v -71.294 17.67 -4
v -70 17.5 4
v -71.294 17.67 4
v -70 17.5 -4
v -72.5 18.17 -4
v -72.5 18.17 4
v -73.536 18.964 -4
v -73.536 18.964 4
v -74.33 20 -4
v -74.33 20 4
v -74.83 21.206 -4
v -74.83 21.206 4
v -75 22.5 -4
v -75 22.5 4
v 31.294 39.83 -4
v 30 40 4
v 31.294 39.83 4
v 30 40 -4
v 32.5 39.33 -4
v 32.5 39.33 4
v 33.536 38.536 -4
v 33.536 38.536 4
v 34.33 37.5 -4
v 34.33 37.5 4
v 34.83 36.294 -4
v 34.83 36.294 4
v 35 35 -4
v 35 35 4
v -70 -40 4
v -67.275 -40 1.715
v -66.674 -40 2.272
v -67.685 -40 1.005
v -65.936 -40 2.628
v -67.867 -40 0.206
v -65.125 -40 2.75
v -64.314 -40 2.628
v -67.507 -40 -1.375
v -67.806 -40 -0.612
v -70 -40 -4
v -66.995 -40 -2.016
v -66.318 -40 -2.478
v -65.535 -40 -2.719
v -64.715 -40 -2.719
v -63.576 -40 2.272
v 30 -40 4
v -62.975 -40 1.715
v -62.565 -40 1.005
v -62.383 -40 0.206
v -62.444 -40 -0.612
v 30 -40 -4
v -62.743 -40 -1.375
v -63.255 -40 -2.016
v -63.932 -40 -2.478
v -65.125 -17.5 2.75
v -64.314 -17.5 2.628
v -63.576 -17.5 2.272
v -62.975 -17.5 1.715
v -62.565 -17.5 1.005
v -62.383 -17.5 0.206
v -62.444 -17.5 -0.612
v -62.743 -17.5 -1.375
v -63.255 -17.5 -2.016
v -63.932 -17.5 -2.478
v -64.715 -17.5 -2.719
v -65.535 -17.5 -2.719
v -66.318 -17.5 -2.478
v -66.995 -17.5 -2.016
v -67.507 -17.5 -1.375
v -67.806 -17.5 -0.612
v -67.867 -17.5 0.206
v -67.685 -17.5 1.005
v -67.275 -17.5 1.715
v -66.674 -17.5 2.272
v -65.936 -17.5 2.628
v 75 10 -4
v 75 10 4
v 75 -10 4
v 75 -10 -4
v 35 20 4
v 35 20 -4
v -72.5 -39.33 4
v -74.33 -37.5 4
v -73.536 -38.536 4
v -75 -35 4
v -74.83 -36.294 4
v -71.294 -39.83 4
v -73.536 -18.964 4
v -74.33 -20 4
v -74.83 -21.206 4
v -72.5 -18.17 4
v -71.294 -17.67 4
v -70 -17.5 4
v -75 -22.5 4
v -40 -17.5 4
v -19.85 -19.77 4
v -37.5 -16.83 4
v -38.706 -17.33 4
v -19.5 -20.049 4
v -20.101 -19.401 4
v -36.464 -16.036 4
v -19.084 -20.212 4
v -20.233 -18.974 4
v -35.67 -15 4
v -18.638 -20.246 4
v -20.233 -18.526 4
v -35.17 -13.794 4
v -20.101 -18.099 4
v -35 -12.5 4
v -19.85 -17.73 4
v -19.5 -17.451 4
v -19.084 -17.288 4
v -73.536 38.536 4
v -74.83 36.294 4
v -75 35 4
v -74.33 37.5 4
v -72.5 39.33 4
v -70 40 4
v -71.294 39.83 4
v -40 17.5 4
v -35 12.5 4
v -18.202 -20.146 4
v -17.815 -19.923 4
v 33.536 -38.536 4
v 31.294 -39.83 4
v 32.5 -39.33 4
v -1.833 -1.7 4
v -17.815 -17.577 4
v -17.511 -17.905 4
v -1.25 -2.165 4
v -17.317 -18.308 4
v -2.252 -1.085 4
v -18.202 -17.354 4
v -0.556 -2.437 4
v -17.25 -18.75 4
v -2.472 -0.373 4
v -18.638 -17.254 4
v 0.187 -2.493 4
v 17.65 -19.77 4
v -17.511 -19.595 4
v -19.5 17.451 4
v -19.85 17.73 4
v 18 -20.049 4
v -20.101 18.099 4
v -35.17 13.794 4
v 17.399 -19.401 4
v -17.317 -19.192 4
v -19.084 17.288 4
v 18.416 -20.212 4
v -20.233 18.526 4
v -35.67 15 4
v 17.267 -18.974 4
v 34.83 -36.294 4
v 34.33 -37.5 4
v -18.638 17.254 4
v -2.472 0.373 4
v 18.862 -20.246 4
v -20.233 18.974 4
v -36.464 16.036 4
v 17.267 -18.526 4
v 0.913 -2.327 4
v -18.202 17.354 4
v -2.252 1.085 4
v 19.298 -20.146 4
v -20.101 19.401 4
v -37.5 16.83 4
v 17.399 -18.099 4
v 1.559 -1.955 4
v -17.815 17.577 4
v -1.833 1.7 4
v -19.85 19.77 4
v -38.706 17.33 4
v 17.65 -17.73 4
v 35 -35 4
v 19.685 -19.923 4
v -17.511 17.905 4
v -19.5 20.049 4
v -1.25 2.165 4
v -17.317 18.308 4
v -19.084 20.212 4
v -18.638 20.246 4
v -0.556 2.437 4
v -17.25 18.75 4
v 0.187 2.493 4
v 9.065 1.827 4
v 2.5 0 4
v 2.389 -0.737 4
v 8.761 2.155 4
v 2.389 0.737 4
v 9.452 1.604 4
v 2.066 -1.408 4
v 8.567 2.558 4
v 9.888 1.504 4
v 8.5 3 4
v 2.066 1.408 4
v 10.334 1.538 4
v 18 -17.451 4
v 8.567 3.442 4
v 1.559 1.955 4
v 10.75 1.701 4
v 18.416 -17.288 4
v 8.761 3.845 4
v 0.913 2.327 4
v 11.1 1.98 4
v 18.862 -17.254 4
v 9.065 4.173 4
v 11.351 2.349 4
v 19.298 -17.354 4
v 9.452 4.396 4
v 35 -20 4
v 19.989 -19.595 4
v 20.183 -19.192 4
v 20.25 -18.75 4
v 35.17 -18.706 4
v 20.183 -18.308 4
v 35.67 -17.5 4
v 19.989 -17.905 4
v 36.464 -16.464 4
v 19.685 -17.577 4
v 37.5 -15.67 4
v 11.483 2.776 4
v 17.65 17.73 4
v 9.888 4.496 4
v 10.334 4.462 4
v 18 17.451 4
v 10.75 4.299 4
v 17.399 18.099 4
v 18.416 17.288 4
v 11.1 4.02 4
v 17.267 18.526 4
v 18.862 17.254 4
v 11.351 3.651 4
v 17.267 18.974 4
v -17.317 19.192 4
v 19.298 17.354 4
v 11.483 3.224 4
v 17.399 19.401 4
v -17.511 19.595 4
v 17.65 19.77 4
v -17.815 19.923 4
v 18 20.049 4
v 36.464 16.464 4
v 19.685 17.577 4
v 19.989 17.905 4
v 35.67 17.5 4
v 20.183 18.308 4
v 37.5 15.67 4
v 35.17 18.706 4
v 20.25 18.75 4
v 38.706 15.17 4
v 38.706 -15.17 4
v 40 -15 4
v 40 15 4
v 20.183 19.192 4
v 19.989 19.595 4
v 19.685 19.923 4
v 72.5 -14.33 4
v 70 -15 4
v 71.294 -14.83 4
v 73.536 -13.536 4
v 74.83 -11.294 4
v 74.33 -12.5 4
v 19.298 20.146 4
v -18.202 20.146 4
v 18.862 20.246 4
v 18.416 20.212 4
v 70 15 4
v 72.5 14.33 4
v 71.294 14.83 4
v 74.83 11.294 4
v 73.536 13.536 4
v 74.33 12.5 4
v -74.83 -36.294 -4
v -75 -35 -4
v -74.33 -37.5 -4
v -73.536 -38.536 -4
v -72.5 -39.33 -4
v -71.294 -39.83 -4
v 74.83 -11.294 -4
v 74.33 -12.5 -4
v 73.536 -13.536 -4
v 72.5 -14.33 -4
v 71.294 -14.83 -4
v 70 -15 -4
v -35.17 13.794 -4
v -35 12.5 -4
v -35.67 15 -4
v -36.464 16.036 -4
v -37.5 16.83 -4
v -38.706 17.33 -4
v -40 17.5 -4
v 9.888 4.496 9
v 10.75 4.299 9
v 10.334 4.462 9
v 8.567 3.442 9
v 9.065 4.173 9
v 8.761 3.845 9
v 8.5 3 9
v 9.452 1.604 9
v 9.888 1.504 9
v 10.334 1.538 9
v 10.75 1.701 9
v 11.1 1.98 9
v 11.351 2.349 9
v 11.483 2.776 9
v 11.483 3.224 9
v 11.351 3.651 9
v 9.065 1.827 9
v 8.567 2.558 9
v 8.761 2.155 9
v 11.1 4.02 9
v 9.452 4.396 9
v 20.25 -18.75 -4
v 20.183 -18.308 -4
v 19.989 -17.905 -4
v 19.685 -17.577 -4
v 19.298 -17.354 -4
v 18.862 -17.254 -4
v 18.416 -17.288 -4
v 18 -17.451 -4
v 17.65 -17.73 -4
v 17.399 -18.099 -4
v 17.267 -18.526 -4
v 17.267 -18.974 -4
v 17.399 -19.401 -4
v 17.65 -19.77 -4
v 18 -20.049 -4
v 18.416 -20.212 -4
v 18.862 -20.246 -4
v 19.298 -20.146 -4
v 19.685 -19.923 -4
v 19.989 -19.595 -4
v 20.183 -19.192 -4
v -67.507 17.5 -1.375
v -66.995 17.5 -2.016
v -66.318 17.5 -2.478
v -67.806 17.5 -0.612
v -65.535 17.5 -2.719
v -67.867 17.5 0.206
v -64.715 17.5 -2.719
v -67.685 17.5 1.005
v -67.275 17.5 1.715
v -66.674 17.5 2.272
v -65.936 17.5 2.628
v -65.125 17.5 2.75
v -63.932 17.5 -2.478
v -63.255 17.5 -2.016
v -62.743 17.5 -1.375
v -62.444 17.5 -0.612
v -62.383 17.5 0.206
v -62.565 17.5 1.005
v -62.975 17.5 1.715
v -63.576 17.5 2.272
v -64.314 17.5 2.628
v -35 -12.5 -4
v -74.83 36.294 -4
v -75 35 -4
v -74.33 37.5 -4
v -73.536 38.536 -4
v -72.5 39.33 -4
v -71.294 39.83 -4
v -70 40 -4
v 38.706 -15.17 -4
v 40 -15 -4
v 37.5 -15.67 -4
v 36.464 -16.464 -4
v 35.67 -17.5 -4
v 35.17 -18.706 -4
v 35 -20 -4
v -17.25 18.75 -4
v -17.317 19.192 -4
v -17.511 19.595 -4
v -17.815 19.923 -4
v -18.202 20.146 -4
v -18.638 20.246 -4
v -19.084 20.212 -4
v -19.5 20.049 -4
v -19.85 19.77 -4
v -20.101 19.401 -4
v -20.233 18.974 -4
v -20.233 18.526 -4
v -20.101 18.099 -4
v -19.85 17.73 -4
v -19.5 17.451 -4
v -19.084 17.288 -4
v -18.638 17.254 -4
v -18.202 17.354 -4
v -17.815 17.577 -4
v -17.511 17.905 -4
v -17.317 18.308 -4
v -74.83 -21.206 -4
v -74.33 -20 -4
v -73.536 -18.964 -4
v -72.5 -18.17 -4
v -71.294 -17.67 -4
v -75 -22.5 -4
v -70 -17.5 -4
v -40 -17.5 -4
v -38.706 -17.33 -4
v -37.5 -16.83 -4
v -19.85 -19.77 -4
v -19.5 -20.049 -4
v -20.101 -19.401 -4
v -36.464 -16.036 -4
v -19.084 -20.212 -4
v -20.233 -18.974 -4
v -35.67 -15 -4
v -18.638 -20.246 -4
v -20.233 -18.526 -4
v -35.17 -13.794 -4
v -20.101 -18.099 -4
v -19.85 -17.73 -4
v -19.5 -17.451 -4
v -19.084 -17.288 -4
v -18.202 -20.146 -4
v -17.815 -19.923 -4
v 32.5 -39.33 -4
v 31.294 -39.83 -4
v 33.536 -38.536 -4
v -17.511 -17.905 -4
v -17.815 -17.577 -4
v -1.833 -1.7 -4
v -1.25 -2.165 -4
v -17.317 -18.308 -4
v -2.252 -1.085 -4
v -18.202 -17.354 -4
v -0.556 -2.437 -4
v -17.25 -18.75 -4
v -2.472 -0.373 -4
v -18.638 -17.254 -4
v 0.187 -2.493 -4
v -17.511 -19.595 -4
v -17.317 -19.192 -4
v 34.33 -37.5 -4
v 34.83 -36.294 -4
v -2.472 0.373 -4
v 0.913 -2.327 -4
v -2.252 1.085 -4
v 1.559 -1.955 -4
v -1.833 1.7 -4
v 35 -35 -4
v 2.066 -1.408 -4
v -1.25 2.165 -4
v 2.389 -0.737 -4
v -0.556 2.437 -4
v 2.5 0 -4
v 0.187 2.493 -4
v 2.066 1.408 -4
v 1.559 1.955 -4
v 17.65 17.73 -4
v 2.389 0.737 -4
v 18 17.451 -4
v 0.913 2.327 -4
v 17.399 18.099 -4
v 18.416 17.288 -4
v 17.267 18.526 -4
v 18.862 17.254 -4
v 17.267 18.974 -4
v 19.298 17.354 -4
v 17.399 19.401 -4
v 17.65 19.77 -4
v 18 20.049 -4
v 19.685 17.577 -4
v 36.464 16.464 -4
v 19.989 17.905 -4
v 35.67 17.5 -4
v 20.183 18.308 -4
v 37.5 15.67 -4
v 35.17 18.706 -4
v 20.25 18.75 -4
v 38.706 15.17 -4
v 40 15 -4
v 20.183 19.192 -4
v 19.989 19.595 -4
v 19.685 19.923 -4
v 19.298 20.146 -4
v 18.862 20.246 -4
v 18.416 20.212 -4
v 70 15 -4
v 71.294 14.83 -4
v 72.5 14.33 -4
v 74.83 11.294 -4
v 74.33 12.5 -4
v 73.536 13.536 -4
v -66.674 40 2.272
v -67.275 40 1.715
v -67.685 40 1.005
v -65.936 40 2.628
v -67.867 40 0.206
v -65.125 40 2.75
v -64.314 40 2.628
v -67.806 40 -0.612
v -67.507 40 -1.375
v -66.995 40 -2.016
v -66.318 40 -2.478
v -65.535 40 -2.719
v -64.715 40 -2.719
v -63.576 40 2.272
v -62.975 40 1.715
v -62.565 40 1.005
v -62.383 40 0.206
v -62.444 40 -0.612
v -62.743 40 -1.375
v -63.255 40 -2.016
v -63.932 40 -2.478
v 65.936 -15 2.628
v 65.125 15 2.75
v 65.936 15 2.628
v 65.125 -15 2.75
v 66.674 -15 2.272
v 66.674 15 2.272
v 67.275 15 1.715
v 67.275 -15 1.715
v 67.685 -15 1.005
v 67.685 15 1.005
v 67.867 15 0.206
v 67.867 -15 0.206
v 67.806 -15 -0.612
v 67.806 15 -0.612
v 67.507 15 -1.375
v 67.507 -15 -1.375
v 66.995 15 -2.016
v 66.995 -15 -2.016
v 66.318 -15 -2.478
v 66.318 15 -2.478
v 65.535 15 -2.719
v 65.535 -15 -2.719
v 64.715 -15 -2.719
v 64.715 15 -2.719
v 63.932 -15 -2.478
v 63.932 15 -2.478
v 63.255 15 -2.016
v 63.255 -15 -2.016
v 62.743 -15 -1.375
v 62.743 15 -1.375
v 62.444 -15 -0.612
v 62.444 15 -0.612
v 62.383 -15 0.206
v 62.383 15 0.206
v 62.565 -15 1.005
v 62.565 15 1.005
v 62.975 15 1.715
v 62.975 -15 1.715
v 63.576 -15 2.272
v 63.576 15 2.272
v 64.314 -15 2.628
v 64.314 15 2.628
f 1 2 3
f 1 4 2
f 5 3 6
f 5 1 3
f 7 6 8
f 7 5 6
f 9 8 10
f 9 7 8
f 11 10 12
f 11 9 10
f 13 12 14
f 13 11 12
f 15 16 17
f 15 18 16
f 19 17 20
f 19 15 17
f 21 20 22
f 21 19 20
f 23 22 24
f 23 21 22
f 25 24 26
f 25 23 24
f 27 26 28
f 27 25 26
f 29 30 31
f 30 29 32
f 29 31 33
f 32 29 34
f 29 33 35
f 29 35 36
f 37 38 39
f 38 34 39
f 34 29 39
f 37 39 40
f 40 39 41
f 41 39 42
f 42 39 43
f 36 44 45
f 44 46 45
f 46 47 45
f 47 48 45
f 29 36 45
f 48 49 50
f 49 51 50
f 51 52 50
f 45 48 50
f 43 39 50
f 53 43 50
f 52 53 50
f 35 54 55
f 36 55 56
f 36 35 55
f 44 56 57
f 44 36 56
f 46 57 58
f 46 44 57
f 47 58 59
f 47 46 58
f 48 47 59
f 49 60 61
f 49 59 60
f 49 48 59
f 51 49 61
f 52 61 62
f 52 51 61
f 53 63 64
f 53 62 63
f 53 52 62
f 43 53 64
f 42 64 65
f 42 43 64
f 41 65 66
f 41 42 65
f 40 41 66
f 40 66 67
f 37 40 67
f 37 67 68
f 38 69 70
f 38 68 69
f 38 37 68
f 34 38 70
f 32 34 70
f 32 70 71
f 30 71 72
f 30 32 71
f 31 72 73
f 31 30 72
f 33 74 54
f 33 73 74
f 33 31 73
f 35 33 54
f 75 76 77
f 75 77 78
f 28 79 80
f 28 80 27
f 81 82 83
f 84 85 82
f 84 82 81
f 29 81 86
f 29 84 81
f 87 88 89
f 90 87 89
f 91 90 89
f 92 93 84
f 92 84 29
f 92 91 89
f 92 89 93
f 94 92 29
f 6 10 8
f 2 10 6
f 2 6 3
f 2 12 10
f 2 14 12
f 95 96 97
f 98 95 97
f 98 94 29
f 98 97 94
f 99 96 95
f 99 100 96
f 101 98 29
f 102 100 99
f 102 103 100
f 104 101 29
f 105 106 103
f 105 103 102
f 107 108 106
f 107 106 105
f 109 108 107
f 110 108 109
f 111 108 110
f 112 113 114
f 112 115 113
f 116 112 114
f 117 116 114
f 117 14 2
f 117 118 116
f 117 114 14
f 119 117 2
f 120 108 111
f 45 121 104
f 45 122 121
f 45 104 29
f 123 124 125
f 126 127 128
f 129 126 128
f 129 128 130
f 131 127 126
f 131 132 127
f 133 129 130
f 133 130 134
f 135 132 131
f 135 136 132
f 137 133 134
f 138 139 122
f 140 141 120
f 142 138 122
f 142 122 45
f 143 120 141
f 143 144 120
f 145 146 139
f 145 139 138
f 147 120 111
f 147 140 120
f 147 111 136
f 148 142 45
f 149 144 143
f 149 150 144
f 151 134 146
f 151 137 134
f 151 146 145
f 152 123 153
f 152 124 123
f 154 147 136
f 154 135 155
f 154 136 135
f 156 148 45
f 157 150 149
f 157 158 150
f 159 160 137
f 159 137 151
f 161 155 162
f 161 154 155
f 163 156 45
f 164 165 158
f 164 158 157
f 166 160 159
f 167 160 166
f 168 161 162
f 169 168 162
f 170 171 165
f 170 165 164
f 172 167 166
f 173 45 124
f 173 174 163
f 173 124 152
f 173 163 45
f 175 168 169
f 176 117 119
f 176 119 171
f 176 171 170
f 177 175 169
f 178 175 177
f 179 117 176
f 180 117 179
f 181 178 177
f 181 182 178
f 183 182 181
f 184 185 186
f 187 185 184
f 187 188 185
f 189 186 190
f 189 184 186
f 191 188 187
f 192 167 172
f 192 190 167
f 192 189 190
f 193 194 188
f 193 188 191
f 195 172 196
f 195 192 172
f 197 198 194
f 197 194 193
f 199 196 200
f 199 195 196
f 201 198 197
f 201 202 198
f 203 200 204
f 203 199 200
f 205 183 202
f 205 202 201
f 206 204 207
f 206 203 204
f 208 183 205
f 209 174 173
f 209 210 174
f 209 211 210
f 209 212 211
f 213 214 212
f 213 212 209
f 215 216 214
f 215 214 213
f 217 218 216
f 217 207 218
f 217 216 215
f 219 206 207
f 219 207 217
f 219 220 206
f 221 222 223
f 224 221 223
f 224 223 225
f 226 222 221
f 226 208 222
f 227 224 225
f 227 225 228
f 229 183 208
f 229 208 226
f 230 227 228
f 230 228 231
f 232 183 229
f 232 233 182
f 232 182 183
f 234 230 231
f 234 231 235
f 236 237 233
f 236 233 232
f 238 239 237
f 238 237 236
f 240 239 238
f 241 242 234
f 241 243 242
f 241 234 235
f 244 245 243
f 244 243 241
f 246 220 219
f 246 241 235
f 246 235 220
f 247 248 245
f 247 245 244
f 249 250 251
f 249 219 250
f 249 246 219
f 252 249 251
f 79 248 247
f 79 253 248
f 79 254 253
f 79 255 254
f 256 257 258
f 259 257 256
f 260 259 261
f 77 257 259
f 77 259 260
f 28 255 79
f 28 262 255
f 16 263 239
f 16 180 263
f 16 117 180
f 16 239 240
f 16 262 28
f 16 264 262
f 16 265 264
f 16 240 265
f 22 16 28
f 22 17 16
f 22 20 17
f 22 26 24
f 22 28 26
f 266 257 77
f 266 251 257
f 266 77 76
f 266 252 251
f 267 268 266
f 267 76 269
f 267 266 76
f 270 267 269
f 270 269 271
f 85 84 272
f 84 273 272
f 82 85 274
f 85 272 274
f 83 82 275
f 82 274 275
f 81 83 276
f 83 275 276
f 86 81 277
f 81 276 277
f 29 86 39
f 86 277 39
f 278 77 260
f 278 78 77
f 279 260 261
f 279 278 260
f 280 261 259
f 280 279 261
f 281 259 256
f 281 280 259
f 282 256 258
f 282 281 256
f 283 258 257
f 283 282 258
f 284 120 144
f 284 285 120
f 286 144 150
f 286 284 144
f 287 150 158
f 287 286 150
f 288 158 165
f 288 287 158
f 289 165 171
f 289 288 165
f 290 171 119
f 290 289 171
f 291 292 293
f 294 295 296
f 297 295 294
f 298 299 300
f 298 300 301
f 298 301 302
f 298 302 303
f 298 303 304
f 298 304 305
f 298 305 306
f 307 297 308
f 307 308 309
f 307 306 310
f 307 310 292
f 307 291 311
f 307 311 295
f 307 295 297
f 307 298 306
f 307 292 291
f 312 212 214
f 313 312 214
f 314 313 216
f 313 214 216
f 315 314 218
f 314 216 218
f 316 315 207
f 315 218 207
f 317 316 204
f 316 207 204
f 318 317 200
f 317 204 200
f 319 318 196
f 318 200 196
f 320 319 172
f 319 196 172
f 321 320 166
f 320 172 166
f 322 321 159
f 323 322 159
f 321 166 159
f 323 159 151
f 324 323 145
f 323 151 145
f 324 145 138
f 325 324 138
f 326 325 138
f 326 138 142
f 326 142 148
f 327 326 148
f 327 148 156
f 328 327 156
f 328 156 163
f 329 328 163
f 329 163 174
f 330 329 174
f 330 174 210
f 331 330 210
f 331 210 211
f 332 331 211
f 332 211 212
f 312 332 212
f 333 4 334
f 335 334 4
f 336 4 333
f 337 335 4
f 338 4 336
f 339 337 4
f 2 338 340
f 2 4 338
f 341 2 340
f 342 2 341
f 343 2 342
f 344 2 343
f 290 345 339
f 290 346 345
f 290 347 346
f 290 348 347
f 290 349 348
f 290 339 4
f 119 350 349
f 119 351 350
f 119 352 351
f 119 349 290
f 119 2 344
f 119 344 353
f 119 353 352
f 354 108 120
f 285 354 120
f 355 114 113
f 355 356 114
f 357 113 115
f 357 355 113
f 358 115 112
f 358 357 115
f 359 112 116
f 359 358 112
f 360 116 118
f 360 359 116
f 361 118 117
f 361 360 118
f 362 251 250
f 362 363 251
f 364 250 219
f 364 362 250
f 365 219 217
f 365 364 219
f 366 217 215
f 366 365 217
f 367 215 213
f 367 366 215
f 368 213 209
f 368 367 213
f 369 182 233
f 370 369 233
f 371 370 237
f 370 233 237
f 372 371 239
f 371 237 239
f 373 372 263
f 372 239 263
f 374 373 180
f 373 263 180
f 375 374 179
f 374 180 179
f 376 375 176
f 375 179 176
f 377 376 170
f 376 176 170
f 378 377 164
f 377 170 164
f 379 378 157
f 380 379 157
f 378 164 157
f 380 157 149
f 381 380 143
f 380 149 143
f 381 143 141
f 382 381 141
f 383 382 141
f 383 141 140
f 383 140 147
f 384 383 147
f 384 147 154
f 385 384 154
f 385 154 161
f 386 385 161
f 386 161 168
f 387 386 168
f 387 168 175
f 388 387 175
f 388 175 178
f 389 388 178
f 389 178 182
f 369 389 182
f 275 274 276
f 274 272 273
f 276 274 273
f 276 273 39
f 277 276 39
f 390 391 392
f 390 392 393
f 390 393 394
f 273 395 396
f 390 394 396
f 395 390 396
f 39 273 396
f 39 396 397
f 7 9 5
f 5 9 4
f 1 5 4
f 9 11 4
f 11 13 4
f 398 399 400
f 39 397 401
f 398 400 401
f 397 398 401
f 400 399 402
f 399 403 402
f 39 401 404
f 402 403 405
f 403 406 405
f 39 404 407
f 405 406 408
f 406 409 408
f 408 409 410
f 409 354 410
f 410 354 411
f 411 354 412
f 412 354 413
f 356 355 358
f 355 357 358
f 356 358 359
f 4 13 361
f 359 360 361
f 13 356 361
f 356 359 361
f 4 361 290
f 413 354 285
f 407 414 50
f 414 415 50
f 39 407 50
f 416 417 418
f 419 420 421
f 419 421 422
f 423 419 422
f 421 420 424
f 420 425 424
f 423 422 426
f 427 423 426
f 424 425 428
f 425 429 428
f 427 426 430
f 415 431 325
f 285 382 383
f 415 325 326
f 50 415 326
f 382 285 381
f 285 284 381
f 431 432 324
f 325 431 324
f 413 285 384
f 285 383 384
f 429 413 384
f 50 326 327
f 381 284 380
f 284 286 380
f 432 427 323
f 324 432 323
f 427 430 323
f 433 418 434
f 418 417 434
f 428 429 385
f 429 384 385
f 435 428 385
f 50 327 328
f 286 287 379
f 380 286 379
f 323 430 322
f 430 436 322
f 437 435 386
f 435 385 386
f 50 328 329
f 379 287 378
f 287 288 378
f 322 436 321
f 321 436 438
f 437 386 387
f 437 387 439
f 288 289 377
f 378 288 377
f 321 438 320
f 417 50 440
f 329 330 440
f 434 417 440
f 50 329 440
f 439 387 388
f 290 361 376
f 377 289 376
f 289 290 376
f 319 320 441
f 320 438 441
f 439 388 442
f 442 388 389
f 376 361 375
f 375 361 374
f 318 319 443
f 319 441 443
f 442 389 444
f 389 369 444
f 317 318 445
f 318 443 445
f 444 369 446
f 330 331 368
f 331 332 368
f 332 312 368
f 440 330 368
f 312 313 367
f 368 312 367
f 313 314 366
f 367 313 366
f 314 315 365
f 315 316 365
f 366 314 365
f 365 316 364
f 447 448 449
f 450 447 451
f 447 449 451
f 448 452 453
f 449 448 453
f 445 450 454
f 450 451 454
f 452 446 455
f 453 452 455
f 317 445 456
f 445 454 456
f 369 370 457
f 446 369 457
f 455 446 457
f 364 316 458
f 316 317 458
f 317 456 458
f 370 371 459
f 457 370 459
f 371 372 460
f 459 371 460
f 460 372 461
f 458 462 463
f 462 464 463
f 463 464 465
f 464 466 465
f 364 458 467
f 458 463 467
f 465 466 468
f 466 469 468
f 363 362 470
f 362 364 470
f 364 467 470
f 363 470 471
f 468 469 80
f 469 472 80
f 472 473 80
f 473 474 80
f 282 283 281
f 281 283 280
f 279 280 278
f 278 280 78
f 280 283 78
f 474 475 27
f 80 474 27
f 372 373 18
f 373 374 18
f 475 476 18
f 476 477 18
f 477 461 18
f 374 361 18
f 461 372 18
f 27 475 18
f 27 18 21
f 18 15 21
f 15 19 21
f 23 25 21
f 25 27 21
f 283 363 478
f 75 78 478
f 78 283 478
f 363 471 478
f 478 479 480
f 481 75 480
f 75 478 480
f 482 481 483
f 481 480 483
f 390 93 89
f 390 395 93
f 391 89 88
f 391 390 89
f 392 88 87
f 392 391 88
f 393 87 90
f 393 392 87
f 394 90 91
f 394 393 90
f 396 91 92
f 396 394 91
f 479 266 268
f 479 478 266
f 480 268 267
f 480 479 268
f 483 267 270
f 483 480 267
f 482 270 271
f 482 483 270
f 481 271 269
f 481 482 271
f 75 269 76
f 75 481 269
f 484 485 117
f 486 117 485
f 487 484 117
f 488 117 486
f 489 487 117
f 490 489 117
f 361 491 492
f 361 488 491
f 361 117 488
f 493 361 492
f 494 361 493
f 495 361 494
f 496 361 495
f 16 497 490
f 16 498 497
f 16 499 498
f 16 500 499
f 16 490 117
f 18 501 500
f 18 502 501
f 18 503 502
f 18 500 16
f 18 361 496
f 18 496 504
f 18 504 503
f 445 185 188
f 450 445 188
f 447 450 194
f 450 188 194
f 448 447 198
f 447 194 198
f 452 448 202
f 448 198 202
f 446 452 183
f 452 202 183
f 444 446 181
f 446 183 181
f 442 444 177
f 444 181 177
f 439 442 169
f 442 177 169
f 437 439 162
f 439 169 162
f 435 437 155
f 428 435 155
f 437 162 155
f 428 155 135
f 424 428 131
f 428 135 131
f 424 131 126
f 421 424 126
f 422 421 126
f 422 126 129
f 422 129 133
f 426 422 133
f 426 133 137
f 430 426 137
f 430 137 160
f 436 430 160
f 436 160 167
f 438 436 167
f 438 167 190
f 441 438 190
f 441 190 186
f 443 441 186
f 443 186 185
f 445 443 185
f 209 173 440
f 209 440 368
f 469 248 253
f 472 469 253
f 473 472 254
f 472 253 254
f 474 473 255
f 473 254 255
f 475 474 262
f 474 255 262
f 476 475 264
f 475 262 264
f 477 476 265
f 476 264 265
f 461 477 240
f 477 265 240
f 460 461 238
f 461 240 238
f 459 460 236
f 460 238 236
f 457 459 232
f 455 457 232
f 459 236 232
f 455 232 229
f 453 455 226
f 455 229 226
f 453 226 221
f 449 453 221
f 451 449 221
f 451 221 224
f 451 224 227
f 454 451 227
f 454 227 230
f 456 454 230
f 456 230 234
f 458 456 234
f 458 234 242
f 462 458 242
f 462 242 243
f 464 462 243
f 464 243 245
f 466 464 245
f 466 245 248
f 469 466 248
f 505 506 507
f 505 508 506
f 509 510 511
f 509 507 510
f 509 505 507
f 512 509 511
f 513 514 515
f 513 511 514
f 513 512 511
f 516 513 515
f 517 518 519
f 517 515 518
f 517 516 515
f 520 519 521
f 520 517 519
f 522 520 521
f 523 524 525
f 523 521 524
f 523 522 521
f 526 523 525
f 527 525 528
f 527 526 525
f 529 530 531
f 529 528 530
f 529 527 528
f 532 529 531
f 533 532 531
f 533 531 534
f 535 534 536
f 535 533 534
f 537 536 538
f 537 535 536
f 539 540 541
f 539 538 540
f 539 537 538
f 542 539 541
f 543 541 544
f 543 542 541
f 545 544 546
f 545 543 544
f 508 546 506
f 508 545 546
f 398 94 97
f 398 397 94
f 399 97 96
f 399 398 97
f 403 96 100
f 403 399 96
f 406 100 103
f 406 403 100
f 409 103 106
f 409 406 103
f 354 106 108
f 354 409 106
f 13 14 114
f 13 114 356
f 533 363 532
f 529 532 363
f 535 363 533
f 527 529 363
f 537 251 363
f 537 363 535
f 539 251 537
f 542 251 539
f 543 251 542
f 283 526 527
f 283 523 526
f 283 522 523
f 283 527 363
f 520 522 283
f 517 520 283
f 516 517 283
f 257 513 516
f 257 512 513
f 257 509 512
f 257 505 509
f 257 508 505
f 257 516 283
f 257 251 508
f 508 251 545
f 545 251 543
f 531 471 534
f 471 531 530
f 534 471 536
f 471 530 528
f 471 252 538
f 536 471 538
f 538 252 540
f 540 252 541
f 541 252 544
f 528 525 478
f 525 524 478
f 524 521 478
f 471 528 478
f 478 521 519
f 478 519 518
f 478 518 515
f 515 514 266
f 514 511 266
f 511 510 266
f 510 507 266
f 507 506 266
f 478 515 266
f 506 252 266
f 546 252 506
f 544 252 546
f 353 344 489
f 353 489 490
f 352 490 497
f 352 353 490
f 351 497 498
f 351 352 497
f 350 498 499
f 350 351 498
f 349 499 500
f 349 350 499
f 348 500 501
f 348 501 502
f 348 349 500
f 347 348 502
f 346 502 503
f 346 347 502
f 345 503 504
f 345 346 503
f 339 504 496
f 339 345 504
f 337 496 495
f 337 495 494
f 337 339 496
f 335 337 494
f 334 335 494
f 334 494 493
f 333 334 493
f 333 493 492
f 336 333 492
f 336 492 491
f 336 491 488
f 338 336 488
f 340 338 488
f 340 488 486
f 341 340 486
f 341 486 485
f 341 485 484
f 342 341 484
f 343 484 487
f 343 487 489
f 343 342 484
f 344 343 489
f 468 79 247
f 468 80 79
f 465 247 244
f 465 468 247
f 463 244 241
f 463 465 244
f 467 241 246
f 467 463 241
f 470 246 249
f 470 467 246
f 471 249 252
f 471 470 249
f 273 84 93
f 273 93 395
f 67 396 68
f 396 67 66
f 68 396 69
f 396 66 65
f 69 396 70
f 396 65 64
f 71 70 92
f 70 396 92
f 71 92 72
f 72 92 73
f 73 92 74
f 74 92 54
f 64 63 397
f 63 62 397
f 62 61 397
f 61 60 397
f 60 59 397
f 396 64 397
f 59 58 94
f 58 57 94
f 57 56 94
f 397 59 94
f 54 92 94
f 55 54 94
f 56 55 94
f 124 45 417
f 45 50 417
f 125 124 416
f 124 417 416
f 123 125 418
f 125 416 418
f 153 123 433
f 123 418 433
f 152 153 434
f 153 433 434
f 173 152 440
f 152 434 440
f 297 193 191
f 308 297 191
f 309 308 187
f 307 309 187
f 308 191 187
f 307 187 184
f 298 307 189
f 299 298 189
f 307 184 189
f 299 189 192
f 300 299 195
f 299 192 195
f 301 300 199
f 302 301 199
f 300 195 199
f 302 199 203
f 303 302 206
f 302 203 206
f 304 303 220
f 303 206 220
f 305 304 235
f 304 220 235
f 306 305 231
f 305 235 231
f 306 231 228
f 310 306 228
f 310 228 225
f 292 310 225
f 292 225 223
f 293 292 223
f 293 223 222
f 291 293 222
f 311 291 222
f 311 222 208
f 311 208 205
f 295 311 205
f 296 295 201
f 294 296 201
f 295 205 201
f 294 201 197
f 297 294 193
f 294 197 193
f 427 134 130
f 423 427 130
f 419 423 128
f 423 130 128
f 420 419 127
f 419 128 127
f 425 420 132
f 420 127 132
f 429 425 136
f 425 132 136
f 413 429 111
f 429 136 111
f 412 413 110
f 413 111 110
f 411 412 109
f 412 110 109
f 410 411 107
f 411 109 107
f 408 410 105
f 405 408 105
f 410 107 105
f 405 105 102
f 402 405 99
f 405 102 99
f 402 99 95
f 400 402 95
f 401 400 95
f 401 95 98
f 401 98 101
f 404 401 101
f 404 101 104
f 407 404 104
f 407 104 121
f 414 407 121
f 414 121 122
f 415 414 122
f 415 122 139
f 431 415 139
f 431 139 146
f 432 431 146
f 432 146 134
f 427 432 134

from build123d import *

# Parameters (mm, degrees)
SKETCH1_W           = 150
SKETCH1_H           = 8
SKETCH1_R           = 2.75
BOSS_EXTRUDE1_DEPTH = 40
SKETCH2_R           = 1.5
CUT_EXTRUDE1_DEPTH  = 86.375640554
SKETCH3_W           = 40
SKETCH3_H           = 35
SKETCH3_H_2         = 25
CUT_EXTRUDE2_DEPTH  = 86.375640554
FILLET1_R           = 5
SKETCH4_R           = 2.5
CUT_EXTRUDE3_DEPTH  = 86.375640554
SKETCH5_R           = 1.5
BOSS_EXTRUDE2_DEPTH = 5


with BuildPart() as part:
    # Sketch1 → Boss-Extrude1 (new, symmetric)
    with BuildSketch(Plane(origin=(0, 0, 0), x_dir=(1, 0, 0), z_dir=(0, 1, 0))):
        Rectangle(SKETCH1_W, SKETCH1_H)
        with Locations(Location((-65.125, 0, 0), (0, 0, 270))):
            Circle(SKETCH1_R, mode=Mode.SUBTRACT)
        with Locations(Location((65.125, 0, 0), (0, 0, 270))):
            Circle(SKETCH1_R, mode=Mode.SUBTRACT)
    extrude(amount=BOSS_EXTRUDE1_DEPTH, both=True)

    # Sketch2 → Cut-Extrude1 (cut, through all)
    with BuildSketch(Plane.XY.offset(4)):
        with Locations((-18.75, 18.75)):
            Circle(SKETCH2_R)
        with Locations((18.75, 18.75)):
            Circle(SKETCH2_R)
        with Locations((18.75, -18.75)):
            Circle(SKETCH2_R)
        with Locations((-18.75, -18.75)):
            Circle(SKETCH2_R)
    extrude(amount=-CUT_EXTRUDE1_DEPTH, mode=Mode.SUBTRACT)

    # Sketch3 → Cut-Extrude2 (cut, through all)
    with BuildSketch(Plane.XY.offset(4)):
        with Locations((-55, 0)):
            Rectangle(SKETCH3_W, SKETCH3_H)
        with Locations((55, 27.5)):
            Rectangle(SKETCH3_W, SKETCH3_H_2)
        with Locations((55, -27.5)):
            Rectangle(SKETCH3_W, SKETCH3_H_2)
    extrude(amount=-CUT_EXTRUDE2_DEPTH, mode=Mode.SUBTRACT)

    # Fillet1
    fillet1_edges = [part.edges().sort_by_distance(p)[0] for p in [
        (-75, 40, 0),
        (-75, -17.5, 0),
        (-75, 17.5, 0),
        (-35, 17.5, 0),
        (-35, -17.5, 0),
        (-75, -40, 0),
        (75, 15, 0),
        (35, 15, 0),
        (35, 40, 0),
        (35, -15, 0),
        (75, -15, 0),
        (35, -40, 0),
    ]]
    fillet(fillet1_edges, radius=FILLET1_R)

    # Sketch4 → Cut-Extrude3 (cut, through all)
    with BuildSketch(Plane.XY.offset(4)):
        Circle(SKETCH4_R)
    extrude(amount=-CUT_EXTRUDE3_DEPTH, mode=Mode.SUBTRACT)

    # Sketch5 → Boss-Extrude2 (add)
    with BuildSketch(Plane.XY.offset(4)):
        with Locations(Location((10, 3, 0), (0, 0, 180))):
            Circle(SKETCH5_R)
    extrude(amount=BOSS_EXTRUDE2_DEPTH)


solid = part.part
